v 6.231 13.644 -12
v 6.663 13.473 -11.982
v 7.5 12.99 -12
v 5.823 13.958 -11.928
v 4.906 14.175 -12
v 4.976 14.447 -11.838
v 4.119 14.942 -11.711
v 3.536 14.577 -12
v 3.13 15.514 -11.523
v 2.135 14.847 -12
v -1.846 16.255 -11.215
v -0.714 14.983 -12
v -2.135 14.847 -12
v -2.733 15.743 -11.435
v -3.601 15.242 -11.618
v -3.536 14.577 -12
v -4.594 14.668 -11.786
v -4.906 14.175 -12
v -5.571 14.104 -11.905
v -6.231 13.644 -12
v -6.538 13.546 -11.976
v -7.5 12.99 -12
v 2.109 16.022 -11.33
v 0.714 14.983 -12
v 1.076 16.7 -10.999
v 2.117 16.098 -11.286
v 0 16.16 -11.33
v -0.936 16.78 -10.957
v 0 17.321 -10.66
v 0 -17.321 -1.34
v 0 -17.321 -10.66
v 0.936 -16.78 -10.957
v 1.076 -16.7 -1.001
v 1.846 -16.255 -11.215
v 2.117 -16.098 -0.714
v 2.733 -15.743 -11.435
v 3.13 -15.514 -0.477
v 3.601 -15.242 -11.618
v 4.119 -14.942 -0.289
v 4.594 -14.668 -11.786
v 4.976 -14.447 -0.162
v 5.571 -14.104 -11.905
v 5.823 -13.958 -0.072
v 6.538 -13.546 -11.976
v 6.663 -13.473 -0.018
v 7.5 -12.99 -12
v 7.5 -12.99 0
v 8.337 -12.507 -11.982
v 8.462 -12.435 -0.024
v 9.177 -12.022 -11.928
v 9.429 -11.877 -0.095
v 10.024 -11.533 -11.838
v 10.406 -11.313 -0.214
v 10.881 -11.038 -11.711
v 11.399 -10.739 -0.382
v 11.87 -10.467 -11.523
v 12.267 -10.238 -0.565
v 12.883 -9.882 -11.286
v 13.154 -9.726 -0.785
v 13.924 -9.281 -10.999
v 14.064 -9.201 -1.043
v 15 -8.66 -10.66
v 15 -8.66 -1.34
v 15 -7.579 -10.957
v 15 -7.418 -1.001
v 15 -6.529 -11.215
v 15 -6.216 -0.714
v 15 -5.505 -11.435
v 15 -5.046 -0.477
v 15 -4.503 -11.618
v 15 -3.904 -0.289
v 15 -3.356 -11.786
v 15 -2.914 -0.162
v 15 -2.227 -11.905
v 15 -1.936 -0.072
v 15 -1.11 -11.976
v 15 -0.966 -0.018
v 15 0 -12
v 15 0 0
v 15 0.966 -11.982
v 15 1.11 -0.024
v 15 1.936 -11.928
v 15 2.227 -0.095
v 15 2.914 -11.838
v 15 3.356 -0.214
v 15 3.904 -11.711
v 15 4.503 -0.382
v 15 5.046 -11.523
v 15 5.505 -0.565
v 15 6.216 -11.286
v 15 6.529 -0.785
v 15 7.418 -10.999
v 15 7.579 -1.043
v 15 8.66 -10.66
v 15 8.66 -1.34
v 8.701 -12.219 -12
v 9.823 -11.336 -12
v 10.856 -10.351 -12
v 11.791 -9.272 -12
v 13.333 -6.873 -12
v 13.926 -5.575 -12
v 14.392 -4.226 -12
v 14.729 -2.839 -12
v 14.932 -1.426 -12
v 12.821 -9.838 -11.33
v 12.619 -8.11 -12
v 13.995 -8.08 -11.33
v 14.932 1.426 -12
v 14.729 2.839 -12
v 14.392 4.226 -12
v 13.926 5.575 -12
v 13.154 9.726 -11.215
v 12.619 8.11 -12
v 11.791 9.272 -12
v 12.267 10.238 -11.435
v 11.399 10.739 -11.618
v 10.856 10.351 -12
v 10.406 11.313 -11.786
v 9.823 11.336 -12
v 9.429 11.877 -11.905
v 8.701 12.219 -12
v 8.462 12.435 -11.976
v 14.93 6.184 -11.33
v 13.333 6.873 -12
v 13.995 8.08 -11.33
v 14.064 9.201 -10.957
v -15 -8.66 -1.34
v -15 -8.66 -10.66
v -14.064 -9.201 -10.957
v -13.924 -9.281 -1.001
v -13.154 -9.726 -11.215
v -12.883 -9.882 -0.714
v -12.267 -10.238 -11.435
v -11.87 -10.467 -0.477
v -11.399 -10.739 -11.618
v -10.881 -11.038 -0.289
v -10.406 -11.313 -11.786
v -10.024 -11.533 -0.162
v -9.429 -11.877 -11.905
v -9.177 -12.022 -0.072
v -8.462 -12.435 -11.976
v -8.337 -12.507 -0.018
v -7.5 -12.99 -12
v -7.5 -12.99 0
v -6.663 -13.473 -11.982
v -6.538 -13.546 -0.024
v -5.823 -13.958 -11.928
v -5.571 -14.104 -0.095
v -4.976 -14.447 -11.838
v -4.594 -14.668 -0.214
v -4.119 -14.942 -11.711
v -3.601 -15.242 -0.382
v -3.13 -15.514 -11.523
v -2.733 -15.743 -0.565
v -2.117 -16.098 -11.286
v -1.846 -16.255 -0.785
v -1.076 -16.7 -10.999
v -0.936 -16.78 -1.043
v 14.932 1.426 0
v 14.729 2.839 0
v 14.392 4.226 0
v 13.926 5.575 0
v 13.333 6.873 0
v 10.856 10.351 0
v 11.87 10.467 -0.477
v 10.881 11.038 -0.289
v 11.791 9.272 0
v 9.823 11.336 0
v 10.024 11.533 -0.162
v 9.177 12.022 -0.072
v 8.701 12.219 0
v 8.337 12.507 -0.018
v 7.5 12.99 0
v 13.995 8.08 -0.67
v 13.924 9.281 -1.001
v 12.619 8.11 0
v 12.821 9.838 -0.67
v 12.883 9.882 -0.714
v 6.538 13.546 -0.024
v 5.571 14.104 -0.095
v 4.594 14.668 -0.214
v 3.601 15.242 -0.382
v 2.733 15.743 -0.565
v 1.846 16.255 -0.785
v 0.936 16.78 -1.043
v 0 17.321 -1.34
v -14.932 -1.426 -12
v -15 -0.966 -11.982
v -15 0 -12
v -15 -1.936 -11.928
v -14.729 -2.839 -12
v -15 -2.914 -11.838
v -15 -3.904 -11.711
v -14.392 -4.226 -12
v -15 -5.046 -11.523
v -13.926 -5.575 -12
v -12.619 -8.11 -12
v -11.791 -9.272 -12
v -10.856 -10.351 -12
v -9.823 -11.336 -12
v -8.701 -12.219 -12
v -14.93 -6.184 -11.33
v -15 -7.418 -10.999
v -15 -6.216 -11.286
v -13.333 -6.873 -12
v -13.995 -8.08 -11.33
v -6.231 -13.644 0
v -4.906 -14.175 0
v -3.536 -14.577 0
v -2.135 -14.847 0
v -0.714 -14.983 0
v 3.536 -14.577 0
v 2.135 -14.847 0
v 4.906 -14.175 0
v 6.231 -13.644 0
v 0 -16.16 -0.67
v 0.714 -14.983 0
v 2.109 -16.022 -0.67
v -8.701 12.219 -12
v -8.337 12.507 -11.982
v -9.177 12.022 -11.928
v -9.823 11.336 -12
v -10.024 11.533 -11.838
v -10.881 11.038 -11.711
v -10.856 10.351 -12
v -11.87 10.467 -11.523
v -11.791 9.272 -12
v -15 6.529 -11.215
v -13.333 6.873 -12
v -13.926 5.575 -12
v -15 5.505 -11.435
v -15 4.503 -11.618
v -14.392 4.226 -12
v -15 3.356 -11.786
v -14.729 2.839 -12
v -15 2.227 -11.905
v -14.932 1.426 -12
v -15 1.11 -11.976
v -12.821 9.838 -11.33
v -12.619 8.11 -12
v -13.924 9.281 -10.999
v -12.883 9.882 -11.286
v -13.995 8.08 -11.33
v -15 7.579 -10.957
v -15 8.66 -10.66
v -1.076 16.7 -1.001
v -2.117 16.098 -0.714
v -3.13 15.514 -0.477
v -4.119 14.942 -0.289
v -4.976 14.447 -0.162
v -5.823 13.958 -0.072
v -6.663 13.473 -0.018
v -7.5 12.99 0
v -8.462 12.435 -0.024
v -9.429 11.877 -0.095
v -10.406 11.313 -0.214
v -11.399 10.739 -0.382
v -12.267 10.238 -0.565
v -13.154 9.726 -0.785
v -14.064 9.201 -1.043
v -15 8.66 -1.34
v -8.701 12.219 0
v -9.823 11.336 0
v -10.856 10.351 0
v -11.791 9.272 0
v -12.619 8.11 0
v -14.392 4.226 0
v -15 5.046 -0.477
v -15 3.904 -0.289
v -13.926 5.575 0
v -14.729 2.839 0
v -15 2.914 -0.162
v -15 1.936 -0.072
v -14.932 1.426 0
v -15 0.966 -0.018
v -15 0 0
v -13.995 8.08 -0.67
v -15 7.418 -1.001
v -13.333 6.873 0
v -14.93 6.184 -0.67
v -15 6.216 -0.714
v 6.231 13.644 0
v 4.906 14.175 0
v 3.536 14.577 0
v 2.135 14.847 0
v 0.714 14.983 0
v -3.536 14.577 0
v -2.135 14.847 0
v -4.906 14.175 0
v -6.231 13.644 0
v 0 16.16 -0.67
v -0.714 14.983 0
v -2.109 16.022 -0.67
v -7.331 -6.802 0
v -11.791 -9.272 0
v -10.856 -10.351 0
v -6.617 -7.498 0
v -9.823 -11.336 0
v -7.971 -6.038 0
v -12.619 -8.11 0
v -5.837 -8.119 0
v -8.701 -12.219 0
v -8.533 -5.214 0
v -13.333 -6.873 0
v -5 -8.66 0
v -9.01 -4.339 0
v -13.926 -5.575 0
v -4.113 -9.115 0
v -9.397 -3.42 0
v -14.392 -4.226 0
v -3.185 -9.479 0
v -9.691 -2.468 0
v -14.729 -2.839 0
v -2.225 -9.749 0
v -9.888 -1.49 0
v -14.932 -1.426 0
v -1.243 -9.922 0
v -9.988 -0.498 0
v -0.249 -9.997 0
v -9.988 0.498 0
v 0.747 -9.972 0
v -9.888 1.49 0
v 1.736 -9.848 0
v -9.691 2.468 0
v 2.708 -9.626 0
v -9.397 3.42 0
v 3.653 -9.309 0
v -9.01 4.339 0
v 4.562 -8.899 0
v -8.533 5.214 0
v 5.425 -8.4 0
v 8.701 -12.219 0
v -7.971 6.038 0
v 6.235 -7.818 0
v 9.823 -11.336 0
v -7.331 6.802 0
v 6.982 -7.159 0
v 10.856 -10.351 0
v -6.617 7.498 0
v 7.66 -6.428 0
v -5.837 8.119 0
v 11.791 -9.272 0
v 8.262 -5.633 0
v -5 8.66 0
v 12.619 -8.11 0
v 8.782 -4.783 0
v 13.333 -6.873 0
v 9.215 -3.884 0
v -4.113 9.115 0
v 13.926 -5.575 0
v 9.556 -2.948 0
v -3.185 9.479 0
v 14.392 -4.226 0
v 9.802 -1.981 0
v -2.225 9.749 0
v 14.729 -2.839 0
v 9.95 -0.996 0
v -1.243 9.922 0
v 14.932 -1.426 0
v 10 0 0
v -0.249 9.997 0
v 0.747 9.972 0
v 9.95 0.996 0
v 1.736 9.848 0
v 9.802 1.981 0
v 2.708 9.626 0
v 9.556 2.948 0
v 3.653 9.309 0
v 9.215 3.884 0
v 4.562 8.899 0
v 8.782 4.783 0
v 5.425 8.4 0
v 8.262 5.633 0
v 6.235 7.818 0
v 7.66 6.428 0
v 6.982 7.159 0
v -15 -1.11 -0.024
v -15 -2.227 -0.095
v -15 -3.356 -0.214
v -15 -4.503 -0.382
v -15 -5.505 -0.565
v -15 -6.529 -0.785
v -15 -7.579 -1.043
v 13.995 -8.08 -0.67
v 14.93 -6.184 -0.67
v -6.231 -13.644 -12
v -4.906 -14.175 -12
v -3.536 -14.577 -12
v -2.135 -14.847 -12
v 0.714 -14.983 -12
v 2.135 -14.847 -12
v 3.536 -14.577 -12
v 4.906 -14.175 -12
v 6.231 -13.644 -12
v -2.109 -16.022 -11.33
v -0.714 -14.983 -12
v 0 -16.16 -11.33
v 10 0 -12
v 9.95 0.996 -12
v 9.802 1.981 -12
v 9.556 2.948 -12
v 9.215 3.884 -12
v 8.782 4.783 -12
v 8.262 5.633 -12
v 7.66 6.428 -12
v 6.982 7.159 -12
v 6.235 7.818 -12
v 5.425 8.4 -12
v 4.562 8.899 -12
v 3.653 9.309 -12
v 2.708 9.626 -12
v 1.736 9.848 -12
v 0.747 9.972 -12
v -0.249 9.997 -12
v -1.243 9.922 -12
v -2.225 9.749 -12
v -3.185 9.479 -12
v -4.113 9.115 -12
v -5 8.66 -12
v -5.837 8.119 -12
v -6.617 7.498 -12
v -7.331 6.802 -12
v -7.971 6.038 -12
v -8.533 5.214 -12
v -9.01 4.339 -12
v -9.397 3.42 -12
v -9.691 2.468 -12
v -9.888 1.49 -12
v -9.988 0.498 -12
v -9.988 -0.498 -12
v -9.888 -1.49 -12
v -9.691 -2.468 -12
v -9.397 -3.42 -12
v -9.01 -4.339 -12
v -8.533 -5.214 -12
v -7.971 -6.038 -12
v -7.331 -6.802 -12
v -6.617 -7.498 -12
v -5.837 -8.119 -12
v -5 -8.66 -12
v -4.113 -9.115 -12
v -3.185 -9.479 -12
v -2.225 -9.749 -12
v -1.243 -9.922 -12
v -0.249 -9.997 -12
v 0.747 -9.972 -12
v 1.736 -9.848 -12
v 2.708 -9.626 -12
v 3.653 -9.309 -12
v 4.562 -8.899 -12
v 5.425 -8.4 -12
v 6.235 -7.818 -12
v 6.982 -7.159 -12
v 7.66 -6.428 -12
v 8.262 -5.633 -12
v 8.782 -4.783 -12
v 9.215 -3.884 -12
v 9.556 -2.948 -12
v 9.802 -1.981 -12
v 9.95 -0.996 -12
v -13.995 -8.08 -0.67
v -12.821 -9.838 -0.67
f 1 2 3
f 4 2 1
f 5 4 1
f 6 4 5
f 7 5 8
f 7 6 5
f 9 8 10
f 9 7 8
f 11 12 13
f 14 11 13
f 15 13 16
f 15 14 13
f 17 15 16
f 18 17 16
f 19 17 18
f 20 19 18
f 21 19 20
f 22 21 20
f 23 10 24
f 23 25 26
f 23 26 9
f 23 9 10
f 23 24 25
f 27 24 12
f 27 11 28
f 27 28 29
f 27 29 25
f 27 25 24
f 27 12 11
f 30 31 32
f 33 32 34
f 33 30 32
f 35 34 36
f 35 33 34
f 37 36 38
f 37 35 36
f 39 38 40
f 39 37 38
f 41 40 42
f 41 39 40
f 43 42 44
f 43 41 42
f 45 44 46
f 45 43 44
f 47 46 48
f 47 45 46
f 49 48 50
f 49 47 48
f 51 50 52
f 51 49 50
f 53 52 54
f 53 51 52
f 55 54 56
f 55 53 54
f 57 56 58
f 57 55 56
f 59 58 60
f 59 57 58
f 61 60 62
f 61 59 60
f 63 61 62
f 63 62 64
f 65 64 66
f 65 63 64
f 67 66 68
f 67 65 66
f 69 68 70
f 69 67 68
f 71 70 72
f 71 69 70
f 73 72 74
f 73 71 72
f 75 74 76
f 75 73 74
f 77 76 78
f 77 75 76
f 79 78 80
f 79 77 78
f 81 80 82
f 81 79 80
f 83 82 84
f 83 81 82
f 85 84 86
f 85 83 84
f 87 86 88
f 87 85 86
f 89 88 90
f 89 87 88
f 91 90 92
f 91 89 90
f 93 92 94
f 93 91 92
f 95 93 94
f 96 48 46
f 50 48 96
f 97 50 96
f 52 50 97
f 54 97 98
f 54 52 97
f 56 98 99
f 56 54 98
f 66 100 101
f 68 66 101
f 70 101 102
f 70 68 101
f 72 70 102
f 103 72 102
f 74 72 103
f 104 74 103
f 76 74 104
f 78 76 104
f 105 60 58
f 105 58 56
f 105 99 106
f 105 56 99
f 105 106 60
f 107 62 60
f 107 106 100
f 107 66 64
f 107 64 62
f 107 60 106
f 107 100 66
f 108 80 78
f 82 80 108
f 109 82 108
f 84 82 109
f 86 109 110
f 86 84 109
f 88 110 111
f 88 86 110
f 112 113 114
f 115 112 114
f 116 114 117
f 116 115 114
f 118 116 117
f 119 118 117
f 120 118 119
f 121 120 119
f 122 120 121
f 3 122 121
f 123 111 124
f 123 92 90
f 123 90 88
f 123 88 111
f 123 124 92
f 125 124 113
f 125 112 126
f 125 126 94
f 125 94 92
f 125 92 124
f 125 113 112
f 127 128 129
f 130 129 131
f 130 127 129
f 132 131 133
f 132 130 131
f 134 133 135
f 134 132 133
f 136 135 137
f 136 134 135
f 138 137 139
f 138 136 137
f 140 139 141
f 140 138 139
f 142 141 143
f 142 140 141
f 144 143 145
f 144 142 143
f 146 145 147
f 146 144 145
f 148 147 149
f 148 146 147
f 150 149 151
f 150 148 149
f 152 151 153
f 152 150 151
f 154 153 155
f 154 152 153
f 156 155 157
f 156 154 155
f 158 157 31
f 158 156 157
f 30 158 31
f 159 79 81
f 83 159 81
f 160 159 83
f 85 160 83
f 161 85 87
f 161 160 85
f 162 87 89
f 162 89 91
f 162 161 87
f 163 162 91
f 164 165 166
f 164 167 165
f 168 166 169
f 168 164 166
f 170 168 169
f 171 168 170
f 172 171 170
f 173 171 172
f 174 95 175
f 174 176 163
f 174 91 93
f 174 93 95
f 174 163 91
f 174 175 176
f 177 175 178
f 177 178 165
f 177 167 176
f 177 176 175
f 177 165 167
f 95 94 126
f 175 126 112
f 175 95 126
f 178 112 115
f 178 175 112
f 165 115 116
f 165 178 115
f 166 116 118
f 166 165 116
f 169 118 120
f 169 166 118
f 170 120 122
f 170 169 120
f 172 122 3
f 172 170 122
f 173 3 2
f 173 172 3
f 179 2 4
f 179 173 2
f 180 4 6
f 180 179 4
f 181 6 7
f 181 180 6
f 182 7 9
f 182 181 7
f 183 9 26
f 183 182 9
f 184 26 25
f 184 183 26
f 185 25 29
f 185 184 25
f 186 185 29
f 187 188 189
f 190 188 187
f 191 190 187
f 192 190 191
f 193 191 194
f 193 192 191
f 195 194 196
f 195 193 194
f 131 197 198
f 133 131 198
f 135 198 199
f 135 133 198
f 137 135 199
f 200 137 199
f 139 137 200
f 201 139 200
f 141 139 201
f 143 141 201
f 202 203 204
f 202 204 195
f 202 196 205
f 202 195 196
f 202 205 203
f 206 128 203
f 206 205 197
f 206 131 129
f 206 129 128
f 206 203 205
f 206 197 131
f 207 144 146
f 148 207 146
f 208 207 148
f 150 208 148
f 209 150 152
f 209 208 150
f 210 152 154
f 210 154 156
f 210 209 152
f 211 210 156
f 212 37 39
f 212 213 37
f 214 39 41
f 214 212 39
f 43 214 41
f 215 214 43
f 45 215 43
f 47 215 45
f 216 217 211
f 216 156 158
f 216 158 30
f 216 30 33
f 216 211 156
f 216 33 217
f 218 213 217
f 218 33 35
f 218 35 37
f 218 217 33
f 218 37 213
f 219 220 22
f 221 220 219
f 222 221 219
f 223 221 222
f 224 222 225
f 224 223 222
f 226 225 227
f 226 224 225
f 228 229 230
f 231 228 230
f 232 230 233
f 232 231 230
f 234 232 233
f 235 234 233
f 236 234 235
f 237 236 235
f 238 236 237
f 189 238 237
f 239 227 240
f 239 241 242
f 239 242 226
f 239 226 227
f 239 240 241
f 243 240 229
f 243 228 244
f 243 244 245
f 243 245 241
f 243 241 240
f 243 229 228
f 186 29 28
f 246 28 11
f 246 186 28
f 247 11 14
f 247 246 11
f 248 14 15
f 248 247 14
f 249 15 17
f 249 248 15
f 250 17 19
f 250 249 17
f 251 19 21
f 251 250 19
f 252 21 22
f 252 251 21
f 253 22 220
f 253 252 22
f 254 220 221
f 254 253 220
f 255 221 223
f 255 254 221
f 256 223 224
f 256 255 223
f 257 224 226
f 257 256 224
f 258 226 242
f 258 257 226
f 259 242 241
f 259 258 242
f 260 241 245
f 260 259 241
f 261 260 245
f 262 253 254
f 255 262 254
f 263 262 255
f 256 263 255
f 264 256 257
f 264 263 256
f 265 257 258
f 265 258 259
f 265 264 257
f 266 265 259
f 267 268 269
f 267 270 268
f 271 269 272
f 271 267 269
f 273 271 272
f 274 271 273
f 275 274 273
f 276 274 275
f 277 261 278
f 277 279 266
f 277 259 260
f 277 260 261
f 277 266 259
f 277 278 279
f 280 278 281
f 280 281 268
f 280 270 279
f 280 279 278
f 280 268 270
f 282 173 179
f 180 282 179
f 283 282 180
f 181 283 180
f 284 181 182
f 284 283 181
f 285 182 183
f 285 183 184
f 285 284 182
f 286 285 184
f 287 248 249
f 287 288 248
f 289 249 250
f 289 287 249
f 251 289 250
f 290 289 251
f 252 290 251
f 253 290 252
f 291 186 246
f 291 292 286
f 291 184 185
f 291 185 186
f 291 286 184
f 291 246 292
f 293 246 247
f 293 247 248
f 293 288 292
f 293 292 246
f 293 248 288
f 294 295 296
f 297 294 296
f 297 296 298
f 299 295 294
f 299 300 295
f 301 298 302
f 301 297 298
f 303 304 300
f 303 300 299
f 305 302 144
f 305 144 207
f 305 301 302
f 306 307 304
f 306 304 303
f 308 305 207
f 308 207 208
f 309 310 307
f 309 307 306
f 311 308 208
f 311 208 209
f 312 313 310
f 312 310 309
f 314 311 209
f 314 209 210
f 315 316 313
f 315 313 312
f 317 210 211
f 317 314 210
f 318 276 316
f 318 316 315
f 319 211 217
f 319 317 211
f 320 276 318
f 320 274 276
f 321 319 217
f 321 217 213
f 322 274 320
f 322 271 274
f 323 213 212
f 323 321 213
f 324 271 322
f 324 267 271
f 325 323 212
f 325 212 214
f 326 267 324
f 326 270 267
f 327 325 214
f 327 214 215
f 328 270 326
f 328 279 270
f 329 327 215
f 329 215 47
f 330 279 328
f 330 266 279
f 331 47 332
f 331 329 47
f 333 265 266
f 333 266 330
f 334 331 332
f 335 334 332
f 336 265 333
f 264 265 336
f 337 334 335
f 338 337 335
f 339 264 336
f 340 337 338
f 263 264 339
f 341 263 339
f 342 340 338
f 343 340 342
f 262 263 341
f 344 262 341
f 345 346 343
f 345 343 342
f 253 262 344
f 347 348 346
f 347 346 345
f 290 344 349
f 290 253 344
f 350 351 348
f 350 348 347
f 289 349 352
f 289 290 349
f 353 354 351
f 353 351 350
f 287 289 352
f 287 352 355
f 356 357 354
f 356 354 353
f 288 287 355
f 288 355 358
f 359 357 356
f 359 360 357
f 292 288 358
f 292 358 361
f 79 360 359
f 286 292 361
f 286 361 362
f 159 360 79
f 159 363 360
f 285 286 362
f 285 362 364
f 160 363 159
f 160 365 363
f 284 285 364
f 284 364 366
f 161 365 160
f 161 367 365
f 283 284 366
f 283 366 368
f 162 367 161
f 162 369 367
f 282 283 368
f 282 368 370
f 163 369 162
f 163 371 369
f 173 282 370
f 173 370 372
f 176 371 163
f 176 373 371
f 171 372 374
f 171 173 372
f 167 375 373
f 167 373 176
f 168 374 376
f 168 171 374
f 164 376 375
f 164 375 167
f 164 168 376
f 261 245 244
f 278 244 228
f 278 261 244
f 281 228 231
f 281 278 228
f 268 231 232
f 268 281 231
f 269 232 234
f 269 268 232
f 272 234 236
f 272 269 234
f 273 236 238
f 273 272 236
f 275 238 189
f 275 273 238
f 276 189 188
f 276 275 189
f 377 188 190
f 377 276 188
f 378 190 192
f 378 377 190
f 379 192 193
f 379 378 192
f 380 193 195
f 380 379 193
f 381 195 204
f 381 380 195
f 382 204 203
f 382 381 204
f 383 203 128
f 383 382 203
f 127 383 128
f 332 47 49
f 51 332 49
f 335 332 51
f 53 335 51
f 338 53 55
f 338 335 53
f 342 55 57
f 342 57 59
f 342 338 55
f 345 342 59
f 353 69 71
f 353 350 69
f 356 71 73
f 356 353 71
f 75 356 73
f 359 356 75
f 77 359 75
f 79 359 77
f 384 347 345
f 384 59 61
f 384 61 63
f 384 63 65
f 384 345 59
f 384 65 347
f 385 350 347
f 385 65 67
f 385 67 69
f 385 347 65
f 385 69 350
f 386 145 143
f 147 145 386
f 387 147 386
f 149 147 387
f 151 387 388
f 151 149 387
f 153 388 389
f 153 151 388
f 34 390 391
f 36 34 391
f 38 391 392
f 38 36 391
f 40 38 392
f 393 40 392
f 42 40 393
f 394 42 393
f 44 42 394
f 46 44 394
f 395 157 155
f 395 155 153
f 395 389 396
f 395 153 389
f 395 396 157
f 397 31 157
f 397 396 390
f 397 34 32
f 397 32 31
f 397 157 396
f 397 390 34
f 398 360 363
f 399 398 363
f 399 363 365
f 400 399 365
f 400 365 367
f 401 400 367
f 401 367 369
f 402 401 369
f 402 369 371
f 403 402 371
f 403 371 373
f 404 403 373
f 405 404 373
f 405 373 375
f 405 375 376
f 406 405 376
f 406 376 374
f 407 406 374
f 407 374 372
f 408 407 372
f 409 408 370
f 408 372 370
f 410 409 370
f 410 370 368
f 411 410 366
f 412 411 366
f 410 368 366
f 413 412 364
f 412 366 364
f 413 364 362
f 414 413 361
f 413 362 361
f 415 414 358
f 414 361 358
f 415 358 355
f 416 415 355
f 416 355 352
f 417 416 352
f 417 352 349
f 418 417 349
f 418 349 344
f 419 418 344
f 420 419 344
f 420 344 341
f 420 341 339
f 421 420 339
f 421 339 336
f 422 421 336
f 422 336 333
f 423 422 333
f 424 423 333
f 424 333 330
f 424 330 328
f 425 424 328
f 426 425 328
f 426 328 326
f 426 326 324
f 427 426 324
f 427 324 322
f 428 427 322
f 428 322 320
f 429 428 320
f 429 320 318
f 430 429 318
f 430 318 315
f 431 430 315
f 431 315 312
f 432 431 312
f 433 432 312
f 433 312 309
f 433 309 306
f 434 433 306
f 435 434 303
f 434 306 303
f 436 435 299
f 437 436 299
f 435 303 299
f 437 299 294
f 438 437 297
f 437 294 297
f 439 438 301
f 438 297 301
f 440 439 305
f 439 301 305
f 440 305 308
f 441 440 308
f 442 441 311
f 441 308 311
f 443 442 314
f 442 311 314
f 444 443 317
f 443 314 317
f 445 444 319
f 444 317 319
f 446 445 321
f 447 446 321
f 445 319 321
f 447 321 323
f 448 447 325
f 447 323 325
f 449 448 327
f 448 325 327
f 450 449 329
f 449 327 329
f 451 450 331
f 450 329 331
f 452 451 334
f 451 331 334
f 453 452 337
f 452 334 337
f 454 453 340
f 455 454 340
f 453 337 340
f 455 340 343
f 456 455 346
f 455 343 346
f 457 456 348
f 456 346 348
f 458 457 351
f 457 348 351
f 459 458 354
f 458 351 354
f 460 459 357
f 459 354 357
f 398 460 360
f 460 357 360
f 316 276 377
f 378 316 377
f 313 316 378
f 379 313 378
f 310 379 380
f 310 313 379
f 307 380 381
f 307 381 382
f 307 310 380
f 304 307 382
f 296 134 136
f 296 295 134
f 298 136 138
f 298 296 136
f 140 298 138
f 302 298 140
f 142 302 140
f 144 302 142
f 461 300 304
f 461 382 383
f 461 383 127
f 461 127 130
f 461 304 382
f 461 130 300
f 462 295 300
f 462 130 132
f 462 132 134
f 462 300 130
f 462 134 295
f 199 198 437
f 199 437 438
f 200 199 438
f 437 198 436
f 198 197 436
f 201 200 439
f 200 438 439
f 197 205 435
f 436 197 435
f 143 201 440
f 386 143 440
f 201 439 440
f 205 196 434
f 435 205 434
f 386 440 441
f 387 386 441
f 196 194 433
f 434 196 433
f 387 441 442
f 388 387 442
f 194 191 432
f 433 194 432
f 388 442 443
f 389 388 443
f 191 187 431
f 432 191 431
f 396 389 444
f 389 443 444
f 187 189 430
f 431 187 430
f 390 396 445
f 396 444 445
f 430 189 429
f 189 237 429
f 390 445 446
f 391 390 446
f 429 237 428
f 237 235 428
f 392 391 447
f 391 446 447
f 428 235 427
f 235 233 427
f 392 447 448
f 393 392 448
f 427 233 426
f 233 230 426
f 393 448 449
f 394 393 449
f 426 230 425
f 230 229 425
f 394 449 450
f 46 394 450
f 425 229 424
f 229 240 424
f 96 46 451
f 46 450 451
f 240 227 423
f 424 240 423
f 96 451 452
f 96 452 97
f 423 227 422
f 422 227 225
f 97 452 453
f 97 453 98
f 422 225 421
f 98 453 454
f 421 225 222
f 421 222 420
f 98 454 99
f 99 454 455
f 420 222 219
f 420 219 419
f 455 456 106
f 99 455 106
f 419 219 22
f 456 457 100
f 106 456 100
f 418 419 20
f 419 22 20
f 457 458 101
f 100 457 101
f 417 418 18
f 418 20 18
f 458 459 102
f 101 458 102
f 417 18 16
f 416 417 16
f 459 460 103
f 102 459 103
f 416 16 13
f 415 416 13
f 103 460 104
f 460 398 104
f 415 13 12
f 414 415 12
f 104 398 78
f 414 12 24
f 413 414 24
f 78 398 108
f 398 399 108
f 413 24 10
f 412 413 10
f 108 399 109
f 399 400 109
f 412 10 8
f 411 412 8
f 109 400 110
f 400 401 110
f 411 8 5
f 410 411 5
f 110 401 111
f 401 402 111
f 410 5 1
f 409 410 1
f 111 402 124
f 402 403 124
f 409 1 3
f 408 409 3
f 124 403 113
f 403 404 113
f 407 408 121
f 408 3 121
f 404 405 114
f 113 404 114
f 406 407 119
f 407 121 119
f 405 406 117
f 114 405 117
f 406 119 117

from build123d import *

# Parameters (mm, degrees)
BASE_EXTRUSION_DEPTH    = 12
ESQUISSE3_R             = 10
ENL_V_MAT_EXTRU_1_DEPTH = 26.865034313


with BuildPart() as part:
    # Esquisse1 → Base-Extrusion (new body)
    with BuildSketch(Plane.XY):
        Polygon((15, -8.660254038), (15, 8.660254038), (0, 17.320508076), (-15, 8.660254038), (-15, -8.660254038), (0, -17.320508076), align=None)
    extrude(amount=-BASE_EXTRUSION_DEPTH)

    # Esquisse2 → Enlèvement de matière-Révolution1 (revolve, cut)
    with BuildSketch(Plane(origin=(0, 0, 0), x_dir=(1, 0, 0), z_dir=(0, 1, 0))):
        Polygon((-15, 0), (-26.392304845, 0), (-26.392304845, 12), (-15, 12), (-25.392304845, 6), align=None)
    revolve(axis=Axis((0, 0, -12), (0, 0, 1)), mode=Mode.SUBTRACT)

    # Esquisse3 → Enlèv. mat.-Extru.1 (cut, through all)
    with BuildSketch(Plane.XY):
        Circle(ESQUISSE3_R)
    extrude(amount=-ENL_V_MAT_EXTRU_1_DEPTH, mode=Mode.SUBTRACT)


solid = part.part
